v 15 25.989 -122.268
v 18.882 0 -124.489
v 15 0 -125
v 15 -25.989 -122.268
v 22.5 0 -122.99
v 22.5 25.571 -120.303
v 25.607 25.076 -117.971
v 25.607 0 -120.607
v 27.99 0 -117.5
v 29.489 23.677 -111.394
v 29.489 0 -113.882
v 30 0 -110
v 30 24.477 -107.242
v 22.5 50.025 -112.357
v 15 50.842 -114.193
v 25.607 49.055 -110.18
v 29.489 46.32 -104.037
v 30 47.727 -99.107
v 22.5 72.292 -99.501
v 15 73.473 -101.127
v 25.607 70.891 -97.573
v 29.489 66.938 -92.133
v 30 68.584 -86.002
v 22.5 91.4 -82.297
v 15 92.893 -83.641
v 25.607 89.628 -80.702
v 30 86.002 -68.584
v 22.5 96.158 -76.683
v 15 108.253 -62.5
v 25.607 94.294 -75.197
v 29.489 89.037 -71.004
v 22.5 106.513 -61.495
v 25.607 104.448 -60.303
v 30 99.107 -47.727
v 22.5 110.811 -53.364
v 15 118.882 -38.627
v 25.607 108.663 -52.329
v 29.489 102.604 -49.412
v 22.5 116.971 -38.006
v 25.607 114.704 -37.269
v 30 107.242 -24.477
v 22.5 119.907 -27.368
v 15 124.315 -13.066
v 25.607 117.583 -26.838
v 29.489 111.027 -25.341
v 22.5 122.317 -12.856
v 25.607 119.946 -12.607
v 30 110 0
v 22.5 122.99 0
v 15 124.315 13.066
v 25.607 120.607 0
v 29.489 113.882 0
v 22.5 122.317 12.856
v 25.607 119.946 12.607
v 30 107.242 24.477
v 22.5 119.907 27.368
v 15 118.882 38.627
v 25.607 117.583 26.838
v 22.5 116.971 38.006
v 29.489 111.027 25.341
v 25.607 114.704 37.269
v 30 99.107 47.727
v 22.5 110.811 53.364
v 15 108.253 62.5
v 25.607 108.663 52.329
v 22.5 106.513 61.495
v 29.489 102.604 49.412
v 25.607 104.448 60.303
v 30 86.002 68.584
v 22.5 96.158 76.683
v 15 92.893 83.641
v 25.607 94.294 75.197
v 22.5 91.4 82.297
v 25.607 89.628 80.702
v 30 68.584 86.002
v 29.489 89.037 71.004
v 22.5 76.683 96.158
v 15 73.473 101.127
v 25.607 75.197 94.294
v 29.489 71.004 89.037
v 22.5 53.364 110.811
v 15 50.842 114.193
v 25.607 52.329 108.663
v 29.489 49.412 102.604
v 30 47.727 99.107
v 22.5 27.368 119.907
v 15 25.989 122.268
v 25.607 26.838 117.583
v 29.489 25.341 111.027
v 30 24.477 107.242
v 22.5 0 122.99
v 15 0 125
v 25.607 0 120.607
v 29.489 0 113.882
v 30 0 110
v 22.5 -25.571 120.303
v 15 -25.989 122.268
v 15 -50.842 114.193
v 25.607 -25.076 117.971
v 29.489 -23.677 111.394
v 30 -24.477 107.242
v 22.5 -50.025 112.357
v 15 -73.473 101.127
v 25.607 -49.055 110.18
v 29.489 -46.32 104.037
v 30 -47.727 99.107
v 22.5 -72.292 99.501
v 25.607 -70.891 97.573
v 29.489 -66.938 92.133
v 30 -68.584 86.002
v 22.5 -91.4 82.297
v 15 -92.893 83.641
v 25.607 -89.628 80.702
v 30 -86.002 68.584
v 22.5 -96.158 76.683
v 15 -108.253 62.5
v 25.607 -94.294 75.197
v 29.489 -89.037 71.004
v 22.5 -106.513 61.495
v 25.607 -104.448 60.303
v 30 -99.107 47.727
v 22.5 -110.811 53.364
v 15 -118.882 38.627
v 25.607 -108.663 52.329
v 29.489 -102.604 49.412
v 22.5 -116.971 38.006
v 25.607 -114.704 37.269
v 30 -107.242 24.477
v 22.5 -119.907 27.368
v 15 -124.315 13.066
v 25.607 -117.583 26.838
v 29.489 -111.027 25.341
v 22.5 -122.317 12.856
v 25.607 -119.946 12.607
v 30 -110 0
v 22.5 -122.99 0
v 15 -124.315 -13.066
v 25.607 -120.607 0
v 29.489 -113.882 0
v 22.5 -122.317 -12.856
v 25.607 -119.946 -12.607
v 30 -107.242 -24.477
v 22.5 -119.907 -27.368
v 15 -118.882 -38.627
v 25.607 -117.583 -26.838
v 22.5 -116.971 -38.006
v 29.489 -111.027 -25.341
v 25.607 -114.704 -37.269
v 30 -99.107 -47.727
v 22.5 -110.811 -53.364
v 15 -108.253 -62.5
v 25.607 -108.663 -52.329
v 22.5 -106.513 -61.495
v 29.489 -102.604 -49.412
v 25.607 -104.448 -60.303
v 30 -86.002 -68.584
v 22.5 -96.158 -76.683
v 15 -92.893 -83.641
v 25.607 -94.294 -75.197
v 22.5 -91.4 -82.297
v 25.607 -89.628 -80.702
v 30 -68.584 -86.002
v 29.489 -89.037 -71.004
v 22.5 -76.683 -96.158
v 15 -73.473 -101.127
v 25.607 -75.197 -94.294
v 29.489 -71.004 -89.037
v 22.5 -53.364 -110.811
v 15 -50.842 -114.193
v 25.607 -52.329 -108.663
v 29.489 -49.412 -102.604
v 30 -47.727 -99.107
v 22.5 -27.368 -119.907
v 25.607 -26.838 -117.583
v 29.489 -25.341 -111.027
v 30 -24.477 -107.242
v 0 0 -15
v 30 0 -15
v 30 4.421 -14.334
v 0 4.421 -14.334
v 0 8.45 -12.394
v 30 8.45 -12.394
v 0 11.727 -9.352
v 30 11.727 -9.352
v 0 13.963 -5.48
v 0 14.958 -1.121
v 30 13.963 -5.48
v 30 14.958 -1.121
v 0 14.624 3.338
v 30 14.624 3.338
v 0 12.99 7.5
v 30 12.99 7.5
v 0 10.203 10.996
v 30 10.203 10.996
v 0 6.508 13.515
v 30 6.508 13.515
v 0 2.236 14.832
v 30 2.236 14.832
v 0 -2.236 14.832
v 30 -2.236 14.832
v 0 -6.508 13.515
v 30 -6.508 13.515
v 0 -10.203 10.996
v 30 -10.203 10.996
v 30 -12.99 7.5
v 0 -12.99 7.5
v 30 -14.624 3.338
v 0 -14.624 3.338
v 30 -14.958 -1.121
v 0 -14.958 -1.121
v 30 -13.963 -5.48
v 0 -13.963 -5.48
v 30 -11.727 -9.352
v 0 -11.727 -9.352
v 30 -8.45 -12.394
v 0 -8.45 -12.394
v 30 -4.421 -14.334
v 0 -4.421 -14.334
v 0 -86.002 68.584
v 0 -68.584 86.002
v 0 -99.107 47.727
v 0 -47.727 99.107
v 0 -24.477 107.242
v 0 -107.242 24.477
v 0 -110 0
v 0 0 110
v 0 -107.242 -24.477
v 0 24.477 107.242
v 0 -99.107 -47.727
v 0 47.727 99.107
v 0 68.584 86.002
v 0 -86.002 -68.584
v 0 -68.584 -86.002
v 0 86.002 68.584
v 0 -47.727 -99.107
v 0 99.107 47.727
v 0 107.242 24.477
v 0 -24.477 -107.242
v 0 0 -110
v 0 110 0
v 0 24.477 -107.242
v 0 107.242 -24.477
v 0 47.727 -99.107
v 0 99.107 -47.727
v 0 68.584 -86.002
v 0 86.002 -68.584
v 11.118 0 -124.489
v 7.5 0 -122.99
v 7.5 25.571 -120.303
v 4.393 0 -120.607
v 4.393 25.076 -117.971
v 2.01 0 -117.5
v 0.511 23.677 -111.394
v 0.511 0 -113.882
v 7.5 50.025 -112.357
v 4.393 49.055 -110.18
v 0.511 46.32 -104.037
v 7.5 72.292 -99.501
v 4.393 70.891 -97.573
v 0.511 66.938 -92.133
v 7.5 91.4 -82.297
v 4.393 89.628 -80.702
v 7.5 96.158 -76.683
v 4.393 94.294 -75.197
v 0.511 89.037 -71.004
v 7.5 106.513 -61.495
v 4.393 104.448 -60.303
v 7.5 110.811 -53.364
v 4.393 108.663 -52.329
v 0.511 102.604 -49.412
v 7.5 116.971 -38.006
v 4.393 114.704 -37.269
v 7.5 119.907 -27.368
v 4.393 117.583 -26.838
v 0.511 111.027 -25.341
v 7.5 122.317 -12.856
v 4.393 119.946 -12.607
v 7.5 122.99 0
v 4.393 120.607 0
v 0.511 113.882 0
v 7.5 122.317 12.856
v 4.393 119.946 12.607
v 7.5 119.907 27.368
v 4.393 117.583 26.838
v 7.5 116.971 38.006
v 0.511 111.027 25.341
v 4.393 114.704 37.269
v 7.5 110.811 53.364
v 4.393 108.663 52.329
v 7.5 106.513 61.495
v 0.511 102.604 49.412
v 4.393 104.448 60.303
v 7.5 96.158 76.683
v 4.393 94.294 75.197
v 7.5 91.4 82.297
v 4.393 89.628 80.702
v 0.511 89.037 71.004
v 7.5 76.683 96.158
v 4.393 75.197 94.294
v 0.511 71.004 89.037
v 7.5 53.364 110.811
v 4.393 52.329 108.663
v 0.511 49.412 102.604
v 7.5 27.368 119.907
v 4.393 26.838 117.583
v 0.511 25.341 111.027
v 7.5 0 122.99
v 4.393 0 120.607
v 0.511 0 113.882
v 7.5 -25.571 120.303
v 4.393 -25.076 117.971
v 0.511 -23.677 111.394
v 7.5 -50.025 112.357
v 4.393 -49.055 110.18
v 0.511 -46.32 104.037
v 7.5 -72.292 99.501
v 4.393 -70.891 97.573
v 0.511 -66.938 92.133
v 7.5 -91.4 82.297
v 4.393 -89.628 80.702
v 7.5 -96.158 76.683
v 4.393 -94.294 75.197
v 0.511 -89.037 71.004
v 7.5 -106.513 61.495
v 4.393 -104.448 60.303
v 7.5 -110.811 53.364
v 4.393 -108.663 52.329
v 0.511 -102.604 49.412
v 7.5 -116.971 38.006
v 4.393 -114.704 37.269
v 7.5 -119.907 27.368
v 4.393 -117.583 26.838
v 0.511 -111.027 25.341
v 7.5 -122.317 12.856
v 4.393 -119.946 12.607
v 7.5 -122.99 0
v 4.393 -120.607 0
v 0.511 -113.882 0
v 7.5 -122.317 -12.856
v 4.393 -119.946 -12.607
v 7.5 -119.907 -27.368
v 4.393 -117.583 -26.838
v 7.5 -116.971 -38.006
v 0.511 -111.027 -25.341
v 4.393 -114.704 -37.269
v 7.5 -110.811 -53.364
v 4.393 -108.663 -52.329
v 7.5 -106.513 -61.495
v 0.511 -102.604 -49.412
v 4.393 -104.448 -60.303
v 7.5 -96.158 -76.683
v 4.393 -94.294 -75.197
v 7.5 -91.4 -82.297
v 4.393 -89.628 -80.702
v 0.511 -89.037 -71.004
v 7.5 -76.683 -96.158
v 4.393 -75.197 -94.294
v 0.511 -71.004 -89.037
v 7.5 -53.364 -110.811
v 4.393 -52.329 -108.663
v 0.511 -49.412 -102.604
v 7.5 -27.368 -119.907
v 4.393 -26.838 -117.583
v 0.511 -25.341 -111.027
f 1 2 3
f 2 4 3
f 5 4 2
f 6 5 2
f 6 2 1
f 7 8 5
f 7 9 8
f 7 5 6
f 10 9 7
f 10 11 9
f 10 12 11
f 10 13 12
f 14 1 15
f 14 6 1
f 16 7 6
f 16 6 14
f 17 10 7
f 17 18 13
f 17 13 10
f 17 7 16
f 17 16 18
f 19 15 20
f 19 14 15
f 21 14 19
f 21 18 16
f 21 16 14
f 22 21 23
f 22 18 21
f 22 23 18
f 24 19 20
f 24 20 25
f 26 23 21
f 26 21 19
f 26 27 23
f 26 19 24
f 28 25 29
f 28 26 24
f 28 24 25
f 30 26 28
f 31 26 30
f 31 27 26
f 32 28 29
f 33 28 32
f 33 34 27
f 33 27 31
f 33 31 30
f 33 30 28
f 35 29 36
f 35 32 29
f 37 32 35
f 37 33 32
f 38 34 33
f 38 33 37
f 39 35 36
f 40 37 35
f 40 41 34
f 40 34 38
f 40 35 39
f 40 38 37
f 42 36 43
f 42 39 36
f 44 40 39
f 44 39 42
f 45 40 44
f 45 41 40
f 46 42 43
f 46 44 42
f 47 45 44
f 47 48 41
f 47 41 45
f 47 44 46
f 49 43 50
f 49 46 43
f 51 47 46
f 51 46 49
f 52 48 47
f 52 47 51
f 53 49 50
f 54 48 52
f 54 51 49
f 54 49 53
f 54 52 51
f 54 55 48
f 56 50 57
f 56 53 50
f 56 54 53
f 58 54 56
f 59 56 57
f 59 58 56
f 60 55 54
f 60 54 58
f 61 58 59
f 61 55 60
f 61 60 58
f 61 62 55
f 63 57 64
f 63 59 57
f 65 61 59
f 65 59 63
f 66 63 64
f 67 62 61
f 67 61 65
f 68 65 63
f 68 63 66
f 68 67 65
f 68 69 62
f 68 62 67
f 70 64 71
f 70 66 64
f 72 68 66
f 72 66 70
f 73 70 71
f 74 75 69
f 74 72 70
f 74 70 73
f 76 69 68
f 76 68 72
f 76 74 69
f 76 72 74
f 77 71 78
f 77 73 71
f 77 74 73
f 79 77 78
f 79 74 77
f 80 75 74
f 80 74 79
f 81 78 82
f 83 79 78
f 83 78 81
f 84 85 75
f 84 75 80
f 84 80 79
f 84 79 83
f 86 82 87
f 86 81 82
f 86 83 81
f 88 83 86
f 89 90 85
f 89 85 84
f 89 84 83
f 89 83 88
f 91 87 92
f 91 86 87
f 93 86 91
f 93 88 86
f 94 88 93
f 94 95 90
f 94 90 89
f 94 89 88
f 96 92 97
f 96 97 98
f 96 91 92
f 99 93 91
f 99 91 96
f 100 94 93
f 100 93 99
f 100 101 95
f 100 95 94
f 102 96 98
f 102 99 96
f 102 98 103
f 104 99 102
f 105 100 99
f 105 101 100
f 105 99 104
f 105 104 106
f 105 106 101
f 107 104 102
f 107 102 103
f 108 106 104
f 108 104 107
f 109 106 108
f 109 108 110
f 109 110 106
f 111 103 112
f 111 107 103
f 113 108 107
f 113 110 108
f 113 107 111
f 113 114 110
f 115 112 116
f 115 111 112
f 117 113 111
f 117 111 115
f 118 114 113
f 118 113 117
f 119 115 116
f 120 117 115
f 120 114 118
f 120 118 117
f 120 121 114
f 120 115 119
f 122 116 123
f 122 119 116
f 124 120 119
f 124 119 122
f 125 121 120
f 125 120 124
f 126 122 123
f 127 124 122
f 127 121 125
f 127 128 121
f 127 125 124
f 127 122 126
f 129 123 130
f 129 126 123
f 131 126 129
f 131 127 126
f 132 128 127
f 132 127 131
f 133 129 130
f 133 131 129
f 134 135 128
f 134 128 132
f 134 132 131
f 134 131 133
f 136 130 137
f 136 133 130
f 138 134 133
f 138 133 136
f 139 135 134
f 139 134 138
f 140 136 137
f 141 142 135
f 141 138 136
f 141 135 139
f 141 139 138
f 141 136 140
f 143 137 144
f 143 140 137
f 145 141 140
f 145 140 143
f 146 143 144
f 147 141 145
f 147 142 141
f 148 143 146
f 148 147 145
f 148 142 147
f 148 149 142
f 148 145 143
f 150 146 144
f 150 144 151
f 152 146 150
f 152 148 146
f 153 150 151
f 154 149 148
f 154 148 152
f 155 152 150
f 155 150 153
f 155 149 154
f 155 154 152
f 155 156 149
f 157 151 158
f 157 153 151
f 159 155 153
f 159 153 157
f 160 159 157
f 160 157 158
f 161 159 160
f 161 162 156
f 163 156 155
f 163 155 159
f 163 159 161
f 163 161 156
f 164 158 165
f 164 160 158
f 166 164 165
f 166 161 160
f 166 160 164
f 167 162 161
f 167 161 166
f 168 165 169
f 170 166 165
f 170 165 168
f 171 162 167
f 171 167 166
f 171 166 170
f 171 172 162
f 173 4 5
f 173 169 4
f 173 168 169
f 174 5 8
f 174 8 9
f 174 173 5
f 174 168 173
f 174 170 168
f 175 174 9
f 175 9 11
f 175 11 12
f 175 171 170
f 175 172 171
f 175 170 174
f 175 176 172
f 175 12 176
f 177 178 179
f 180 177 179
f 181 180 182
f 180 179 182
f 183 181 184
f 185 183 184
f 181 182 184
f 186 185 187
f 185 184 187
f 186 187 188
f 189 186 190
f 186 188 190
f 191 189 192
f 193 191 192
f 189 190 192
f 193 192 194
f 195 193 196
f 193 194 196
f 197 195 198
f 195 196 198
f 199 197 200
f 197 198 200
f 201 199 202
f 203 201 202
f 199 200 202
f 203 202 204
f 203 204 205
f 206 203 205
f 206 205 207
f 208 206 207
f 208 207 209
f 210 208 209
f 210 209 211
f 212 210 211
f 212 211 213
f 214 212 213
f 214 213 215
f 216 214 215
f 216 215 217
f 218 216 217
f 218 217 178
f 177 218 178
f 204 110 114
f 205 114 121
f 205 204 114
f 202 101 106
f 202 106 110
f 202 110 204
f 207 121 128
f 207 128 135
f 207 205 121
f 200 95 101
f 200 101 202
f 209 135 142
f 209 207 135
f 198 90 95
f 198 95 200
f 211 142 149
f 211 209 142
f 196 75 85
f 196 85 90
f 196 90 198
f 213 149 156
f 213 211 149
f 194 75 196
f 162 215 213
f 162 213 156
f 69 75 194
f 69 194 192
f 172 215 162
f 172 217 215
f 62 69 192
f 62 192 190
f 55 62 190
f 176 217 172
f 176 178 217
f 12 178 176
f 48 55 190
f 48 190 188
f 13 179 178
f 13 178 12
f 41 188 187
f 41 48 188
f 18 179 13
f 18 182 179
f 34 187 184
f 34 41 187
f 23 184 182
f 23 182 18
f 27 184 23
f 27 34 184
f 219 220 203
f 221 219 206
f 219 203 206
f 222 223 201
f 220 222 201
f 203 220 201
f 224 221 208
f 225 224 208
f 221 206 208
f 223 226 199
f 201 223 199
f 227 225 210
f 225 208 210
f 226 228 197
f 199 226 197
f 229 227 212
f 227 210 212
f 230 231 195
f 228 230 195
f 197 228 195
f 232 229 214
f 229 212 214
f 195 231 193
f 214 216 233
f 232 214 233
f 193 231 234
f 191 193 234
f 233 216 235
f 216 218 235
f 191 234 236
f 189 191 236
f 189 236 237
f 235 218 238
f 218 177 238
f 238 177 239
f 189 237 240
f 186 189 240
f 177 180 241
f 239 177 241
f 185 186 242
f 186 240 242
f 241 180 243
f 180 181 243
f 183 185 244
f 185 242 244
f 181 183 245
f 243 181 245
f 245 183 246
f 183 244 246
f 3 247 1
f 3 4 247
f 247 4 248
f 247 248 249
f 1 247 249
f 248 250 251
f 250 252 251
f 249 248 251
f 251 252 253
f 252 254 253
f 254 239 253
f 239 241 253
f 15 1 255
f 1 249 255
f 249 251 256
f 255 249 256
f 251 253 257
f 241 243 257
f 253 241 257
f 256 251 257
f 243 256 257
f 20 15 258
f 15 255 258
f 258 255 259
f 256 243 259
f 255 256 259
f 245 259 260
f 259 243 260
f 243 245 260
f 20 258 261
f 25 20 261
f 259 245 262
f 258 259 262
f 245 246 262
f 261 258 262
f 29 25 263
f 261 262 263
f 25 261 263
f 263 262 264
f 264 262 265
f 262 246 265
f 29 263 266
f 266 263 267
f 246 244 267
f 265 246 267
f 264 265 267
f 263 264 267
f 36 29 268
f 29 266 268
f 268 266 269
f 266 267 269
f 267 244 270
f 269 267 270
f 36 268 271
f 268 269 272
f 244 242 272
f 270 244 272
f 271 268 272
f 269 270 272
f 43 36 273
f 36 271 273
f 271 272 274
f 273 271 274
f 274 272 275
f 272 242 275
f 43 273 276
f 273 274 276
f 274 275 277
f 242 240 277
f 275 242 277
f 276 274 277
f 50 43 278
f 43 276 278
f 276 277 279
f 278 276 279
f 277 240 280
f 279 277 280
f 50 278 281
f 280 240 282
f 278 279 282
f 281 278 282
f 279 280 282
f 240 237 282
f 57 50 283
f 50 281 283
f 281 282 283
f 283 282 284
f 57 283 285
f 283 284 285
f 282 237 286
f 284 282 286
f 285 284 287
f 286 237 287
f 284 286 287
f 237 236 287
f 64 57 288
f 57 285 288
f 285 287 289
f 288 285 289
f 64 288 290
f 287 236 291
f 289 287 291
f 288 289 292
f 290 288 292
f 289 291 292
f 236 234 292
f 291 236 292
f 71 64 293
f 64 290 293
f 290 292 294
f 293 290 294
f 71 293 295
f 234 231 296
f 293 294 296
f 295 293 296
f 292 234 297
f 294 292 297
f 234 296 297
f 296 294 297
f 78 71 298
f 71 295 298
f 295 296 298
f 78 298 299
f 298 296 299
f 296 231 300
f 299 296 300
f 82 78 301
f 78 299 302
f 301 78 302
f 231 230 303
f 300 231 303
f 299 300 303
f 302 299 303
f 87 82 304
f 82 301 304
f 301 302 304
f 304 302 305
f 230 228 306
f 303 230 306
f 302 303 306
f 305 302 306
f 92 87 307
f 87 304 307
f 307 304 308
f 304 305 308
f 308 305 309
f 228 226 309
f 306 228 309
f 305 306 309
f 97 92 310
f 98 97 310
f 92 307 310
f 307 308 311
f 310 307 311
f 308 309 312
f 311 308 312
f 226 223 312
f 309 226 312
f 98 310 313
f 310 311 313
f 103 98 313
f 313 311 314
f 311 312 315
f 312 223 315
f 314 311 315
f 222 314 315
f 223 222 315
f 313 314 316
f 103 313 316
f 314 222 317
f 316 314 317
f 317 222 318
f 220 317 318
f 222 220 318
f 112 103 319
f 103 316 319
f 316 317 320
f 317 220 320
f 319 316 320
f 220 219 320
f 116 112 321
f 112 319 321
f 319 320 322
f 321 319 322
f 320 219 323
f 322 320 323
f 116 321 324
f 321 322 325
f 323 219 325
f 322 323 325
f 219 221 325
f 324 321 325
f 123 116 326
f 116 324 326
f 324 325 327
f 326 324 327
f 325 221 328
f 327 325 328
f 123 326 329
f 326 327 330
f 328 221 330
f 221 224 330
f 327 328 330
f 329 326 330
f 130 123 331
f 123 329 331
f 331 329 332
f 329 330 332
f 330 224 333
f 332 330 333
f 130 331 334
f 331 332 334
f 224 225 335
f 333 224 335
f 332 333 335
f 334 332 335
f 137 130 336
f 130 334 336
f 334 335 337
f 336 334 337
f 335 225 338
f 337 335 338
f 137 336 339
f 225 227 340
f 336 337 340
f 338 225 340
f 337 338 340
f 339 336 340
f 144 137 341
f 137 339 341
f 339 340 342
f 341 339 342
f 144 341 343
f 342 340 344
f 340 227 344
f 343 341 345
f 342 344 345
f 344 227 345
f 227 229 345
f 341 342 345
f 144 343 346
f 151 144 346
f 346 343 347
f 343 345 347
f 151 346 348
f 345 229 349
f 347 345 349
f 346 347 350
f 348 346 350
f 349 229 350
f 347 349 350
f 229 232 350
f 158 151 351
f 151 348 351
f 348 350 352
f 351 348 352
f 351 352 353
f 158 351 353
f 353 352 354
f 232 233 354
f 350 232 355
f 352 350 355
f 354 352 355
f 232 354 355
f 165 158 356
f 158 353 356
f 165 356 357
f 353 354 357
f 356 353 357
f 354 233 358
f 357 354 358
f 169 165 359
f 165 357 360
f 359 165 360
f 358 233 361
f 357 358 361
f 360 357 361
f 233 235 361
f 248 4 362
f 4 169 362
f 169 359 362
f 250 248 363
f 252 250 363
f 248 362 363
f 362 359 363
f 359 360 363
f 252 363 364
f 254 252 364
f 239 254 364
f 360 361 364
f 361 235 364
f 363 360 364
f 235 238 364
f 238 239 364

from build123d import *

# Parameters (mm, degrees)
SKETCH1_R           = 125
BOSS_EXTRUDE1_DEPTH = 30
FILLET1_R           = 15
SKETCH2_R           = 15
CUT_EXTRUDE1_DEPTH  = 180.30421084


with BuildPart() as part:
    # Sketch1 → Boss-Extrude1 (new body)
    with BuildSketch(Plane(origin=(0, 0, 0), x_dir=(0, 0, -1), z_dir=(1, 0, 0))):
        Circle(SKETCH1_R)
    extrude(amount=BOSS_EXTRUDE1_DEPTH)

    # Fillet1
    fillet1_edges = [part.edges().sort_by_distance(p)[0] for p in [
        (0, 0, 125),
        (30, 0, 125),
    ]]
    fillet(fillet1_edges, radius=FILLET1_R - 0.0001)  # a hair under: the kernel refuses the full size

    # Sketch2 → Cut-Extrude1 (cut, through all)
    with BuildSketch(Plane(origin=(30, 0, 0), x_dir=(0, 0, -1), z_dir=(1, 0, 0))):
        Circle(SKETCH2_R)
    extrude(amount=-CUT_EXTRUDE1_DEPTH, mode=Mode.SUBTRACT)


solid = part.part
